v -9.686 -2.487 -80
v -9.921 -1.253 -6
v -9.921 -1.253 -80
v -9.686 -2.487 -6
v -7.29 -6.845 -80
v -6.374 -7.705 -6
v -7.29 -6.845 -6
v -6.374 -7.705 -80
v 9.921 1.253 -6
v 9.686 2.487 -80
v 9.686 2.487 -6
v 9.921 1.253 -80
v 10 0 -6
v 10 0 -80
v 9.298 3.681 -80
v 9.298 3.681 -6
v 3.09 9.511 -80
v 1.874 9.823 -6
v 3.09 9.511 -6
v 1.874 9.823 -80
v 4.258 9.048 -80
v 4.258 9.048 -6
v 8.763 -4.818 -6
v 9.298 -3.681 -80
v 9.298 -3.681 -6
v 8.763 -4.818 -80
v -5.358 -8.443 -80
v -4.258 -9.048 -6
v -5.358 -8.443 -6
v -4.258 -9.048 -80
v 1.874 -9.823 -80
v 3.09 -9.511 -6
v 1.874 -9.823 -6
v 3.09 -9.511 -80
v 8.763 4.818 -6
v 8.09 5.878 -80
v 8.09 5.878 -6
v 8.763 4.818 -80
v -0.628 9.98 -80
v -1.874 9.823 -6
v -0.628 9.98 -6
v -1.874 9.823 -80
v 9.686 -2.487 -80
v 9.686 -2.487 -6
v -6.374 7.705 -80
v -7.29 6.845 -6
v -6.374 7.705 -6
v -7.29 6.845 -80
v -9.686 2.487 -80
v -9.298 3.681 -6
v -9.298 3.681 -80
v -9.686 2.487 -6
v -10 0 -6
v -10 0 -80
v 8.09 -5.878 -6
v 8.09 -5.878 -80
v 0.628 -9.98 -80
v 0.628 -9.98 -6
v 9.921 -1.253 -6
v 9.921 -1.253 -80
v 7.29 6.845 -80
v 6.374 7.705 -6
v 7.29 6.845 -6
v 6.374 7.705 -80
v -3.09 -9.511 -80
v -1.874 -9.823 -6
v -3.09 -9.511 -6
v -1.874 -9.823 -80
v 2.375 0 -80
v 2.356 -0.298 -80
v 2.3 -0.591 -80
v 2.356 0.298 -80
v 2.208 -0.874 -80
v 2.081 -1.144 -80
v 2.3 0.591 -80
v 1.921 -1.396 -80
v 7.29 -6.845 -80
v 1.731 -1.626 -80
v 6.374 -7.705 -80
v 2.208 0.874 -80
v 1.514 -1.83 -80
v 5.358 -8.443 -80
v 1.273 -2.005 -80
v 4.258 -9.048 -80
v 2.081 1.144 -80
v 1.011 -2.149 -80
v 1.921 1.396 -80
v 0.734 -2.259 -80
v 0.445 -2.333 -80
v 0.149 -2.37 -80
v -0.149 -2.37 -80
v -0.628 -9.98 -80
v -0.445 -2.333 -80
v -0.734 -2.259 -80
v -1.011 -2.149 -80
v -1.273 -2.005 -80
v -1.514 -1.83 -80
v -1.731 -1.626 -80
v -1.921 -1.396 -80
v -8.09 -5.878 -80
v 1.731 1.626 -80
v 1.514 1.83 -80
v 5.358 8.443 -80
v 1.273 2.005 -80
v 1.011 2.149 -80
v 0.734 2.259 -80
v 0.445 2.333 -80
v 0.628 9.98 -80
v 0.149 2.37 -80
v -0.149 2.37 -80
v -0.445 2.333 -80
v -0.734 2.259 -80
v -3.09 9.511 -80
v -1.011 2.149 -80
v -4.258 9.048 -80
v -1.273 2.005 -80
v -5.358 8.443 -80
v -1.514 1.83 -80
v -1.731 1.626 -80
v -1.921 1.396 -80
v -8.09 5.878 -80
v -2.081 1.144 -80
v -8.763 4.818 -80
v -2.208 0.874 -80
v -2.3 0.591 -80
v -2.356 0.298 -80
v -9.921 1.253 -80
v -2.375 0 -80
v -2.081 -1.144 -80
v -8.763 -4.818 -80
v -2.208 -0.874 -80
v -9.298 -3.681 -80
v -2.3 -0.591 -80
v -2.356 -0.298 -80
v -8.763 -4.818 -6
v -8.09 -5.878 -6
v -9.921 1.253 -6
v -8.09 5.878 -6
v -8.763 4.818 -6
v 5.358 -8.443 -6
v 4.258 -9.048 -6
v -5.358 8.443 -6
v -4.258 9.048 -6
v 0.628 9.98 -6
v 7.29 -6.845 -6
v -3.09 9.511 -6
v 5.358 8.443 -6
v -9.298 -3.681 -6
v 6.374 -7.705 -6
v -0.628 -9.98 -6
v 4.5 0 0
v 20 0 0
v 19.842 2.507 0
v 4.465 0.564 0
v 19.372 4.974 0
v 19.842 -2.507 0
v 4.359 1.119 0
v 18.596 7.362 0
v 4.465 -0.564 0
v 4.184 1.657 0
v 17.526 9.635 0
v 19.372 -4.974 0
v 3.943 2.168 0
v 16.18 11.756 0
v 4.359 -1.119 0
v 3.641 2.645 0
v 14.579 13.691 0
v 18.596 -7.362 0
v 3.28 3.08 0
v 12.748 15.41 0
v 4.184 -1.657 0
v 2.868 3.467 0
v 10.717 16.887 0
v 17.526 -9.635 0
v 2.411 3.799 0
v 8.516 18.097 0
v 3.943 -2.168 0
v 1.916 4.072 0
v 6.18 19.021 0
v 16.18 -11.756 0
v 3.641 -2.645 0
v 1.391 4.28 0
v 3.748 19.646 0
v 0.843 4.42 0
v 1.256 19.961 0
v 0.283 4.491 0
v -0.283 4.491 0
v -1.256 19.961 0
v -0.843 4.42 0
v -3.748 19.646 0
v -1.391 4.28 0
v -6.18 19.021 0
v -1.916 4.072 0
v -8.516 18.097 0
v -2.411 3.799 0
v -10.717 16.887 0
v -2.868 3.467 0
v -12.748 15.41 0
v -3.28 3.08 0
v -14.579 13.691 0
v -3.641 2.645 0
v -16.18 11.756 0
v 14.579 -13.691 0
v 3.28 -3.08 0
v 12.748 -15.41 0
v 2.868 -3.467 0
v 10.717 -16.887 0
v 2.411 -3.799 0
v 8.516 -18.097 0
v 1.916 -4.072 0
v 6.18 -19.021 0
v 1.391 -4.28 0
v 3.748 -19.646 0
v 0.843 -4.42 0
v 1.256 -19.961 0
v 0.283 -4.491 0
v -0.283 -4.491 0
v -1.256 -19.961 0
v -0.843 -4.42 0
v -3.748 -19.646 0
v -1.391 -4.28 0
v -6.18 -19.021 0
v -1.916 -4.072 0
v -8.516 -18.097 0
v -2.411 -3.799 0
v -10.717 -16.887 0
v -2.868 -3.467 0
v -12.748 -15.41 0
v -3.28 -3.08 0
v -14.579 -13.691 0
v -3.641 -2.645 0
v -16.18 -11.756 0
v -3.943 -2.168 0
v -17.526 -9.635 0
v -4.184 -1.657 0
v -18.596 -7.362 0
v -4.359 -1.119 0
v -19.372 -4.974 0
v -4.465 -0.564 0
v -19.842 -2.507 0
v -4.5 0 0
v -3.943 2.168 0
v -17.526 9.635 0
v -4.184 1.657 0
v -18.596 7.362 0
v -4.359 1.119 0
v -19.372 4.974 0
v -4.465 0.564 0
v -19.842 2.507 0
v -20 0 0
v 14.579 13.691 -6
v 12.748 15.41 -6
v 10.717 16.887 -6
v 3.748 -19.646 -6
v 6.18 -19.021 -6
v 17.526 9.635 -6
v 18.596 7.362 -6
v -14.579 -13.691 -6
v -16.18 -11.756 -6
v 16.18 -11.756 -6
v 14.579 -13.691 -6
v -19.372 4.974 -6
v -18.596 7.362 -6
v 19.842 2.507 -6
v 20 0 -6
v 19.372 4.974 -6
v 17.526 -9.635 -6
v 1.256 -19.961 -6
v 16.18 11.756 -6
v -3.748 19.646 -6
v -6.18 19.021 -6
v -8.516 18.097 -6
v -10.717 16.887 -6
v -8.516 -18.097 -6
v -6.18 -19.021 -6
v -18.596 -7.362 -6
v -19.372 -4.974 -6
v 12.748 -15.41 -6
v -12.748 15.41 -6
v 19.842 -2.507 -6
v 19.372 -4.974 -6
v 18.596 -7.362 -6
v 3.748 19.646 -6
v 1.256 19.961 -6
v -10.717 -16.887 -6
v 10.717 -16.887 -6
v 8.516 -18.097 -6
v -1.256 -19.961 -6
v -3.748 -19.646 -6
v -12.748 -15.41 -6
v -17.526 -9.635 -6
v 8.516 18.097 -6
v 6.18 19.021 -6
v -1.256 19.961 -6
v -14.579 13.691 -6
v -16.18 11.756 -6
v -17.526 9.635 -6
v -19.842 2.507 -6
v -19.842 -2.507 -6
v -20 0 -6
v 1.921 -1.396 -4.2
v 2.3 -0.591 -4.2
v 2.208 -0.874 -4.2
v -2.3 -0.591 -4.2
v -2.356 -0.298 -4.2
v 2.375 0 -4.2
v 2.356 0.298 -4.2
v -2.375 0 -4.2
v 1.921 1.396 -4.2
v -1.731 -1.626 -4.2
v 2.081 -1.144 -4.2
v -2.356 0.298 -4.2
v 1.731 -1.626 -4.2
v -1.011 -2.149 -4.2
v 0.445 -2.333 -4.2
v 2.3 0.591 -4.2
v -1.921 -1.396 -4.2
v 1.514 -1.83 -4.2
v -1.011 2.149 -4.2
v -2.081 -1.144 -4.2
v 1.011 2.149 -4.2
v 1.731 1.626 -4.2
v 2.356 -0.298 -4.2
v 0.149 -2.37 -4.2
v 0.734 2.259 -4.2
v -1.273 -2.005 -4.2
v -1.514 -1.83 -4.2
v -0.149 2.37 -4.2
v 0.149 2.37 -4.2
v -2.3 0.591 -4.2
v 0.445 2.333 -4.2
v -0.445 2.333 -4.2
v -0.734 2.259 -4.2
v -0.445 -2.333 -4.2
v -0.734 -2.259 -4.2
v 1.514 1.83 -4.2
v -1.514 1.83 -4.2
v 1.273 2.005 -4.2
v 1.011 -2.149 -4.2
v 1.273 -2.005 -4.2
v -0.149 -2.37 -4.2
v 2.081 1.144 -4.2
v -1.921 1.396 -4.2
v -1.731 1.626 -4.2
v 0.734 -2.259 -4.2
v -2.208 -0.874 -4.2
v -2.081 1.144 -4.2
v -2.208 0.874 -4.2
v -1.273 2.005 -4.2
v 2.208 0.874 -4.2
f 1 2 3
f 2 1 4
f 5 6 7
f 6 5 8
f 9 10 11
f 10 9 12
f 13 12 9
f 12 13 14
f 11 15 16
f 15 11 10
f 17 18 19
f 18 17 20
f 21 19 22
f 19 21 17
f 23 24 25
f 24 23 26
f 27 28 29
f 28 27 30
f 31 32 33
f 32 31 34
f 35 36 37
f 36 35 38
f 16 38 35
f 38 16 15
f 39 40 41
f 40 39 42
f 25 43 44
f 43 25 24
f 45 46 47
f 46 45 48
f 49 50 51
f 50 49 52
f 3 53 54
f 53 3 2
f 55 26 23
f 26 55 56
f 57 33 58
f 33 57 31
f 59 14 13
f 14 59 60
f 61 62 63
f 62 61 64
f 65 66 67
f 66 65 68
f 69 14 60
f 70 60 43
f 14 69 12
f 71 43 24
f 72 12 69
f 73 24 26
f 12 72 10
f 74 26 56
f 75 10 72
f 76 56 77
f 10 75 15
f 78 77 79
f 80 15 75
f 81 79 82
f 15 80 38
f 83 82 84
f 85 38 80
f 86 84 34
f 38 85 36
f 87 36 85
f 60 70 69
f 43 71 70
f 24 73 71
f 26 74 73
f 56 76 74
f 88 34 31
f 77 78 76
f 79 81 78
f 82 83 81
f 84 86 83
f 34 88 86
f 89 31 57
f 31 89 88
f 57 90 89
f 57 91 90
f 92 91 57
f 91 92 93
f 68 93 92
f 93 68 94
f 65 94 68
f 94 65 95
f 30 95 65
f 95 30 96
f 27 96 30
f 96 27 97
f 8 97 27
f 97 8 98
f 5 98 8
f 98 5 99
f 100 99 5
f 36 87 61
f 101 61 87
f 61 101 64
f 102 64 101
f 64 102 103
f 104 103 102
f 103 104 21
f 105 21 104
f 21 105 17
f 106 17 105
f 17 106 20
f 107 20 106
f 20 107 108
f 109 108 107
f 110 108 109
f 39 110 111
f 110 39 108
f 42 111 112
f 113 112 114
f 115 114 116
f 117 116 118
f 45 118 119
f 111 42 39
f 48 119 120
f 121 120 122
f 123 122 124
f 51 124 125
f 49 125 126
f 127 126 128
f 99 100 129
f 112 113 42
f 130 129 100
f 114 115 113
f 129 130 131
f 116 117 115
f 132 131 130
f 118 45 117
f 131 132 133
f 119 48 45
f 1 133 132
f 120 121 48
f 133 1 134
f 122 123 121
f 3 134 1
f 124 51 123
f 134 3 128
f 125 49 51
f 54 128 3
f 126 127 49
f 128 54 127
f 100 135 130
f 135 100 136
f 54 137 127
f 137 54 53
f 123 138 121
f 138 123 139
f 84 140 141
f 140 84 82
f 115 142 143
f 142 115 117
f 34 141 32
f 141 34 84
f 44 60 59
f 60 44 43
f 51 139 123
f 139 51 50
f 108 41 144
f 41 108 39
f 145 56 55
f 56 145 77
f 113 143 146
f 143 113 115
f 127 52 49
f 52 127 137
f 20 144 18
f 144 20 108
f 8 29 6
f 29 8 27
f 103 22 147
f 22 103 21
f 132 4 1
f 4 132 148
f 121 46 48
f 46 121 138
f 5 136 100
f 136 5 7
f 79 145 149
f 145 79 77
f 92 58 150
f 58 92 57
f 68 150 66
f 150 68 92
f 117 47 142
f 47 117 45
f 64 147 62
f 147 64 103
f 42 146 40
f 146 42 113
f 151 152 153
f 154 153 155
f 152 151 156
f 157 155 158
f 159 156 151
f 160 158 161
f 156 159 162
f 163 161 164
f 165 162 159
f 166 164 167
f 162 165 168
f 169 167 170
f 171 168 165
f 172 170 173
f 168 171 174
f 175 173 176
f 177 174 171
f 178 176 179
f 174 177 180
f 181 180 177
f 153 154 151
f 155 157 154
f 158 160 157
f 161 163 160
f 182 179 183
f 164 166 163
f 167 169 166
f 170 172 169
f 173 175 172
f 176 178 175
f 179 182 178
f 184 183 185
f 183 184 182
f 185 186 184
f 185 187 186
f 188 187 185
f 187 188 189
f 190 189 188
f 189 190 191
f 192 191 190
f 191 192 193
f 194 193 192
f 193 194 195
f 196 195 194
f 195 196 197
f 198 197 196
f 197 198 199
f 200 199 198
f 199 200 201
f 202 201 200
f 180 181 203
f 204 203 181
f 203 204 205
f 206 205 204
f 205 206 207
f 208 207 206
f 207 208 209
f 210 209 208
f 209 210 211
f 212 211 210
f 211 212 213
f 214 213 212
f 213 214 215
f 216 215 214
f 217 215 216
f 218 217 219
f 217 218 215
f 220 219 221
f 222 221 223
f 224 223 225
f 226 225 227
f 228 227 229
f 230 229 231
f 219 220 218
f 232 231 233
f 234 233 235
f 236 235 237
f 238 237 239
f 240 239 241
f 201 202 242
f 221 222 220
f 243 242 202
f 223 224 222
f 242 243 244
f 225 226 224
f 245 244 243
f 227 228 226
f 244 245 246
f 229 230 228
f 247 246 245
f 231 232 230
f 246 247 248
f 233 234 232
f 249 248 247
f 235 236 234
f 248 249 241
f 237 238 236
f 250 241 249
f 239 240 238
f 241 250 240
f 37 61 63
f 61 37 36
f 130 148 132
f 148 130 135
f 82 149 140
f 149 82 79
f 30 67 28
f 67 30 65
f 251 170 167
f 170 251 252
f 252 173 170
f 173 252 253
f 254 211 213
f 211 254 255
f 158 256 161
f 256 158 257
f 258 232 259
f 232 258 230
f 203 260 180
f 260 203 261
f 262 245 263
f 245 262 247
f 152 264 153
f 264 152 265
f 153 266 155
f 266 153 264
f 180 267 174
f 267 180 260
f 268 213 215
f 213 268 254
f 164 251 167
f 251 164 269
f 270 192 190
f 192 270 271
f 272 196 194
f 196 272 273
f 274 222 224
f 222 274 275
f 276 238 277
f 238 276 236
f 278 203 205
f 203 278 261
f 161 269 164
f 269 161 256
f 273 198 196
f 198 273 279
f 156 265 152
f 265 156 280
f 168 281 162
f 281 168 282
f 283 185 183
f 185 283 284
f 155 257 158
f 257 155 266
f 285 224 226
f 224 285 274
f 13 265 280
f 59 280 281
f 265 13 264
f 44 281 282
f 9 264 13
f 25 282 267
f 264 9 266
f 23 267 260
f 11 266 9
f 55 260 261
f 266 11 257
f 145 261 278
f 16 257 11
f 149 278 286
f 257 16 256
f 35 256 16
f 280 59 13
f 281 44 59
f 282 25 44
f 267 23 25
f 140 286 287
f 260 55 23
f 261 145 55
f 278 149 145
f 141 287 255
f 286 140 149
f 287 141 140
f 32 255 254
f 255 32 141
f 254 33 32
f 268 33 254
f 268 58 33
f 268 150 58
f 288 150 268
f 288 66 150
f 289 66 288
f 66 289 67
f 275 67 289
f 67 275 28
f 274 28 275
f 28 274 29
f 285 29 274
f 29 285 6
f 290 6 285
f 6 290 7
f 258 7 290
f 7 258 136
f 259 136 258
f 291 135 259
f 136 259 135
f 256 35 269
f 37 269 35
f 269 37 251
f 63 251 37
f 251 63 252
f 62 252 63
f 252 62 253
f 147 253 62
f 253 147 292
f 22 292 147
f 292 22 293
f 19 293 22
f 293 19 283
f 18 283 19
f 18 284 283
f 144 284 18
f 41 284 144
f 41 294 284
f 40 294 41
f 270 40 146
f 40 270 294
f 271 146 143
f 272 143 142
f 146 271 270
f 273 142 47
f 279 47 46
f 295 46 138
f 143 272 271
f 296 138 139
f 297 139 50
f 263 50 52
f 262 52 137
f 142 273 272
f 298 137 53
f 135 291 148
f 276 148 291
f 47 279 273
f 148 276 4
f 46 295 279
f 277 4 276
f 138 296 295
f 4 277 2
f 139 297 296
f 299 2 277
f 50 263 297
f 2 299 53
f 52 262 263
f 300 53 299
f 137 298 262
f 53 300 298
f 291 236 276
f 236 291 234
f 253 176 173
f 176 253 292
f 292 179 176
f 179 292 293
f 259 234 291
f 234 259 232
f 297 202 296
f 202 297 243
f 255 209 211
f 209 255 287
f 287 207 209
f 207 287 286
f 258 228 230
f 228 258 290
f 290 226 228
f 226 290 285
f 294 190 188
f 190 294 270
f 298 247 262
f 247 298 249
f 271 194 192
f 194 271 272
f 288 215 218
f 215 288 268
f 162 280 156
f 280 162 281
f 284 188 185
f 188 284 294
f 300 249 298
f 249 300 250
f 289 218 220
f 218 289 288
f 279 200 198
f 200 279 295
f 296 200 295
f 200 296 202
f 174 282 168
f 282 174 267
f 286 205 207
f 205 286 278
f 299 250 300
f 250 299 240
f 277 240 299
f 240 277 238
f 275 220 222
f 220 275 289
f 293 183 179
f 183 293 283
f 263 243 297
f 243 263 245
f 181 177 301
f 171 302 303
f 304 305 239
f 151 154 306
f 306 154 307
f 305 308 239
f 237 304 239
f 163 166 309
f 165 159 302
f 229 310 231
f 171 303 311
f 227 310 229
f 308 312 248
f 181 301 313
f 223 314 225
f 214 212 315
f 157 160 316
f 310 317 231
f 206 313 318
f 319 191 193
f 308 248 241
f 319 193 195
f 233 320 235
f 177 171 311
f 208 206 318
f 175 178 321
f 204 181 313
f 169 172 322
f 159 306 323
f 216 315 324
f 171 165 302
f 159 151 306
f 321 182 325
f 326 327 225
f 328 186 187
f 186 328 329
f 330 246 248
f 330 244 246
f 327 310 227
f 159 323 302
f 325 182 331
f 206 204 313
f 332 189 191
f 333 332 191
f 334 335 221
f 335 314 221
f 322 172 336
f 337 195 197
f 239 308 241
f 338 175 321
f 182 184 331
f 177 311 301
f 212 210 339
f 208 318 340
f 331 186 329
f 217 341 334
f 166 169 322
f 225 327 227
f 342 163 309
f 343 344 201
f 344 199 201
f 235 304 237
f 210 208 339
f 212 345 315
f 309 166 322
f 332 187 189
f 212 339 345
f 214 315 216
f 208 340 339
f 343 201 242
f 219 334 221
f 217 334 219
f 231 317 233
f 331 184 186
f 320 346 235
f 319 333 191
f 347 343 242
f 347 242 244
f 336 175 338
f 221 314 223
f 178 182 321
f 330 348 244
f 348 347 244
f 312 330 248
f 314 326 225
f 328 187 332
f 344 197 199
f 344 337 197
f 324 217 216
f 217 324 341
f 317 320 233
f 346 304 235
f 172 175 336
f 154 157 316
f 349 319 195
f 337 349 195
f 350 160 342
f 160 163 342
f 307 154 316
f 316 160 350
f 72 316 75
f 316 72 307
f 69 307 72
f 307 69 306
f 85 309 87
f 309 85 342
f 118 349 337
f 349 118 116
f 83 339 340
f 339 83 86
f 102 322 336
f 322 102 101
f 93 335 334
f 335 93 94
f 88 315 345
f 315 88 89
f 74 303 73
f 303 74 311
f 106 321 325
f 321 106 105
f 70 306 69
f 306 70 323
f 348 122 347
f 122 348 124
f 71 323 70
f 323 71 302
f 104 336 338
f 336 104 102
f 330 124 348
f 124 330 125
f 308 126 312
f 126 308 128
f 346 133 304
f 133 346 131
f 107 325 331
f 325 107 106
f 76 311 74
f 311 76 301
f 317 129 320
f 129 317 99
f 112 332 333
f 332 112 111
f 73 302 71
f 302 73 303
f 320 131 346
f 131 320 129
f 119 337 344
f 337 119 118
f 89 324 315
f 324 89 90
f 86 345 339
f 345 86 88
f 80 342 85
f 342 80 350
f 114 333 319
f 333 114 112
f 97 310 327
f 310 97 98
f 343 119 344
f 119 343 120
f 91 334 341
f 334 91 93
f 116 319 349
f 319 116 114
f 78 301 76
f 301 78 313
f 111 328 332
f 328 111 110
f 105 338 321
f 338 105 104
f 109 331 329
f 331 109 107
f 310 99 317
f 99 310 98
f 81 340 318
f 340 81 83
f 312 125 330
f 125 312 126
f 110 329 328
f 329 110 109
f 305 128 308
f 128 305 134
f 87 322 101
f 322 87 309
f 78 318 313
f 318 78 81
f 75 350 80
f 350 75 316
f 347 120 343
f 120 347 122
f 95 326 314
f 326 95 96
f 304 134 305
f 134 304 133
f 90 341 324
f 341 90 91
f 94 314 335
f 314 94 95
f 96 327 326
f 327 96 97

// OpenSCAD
$fn = 50;


difference() {
	union() {
		translate(v = [0, 0, -80.0000000000]) {
			cylinder(h = 80, r = 10.0000000000);
		}
		translate(v = [0, 0, -6.0000000000]) {
			cylinder(h = 6, r = 20.0000000000);
		}
	}
	union() {
		translate(v = [0, 0, 0]) {
			rotate(a = [0, 0, 0]) {
				difference() {
					union() {
						#translate(v = [0, 0, -80.0000000000]) {
							cylinder(h = 80, r = 2.2500000000);
						}
						#translate(v = [0, 0, -4.2000000000]) {
							cylinder(h = 4.2000000000, r1 = 2.3750000000, r2 = 4.5000000000);
						}
						#translate(v = [0, 0, -80.0000000000]) {
							cylinder(h = 80, r = 2.3750000000);
						}
						#translate(v = [0, 0, -80.0000000000]) {
							cylinder(h = 80, r = 2.2500000000);
						}
					}
					union();
				}
			}
		}
	}
}
